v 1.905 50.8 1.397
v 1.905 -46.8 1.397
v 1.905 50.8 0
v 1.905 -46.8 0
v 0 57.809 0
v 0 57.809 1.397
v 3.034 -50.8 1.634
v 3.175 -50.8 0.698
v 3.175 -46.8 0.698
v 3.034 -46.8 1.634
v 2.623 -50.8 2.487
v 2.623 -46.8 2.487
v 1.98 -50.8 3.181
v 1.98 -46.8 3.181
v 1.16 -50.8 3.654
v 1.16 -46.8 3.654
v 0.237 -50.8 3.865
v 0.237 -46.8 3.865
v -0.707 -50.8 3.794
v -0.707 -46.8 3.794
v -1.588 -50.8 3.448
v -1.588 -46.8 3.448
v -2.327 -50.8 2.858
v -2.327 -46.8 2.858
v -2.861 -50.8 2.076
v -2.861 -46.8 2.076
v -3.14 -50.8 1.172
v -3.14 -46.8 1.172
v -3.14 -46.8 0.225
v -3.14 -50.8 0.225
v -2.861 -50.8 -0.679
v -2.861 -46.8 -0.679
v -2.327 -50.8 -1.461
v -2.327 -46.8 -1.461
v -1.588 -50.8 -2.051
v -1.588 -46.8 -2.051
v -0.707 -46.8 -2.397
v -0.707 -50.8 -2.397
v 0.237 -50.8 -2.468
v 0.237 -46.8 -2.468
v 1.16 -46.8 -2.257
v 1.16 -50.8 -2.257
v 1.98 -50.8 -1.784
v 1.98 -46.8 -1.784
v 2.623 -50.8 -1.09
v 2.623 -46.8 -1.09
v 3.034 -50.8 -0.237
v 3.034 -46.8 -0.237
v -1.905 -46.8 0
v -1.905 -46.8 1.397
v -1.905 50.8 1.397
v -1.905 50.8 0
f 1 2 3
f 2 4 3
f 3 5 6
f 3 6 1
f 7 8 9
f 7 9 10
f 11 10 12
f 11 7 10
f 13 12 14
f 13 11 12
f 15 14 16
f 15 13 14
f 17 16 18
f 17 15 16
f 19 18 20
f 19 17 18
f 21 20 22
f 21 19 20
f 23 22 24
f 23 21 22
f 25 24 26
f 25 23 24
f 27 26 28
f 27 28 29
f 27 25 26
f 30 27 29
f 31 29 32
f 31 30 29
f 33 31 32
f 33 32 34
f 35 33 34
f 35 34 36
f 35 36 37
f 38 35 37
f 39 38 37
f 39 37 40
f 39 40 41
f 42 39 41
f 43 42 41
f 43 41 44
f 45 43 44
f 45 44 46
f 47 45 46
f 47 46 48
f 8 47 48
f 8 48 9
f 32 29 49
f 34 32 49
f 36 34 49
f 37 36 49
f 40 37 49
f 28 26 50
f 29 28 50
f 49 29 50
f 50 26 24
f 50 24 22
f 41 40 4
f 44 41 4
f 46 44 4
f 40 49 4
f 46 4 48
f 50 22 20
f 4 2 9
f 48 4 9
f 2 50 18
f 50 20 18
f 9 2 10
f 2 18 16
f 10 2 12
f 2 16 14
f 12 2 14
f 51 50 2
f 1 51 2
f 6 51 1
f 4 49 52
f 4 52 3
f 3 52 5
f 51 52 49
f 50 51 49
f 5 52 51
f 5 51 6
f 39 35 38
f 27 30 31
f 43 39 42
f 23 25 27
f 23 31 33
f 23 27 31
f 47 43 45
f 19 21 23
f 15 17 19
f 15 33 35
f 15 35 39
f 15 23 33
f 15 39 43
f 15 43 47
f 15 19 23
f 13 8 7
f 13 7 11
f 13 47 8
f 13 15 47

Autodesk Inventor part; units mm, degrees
ref_plane "YZ Plane" through (0, 0, 0) normal (1, 0, 0) x (0, 1, 0)
sketch "Sketch1" plane through (0, 0, 0) normal (0, 0, 1) x (1, 0, 0)
  line L0 (-1.905, -50.8) -> (1.905, -50.8)
  line L1 (1.905, -50.8) -> (1.905, 50.8)
  line L2 (1.905, 50.8) -> (-1.905, 50.8) construction
  line L3 (-1.905, 50.8) -> (-1.905, -50.8)
  line L4 (-1.905, -50.8) -> (1.905, 50.8) construction
  line L5 (1.905, -50.8) -> (-1.905, 50.8) construction
  line L6 (-1.905, 50.8) -> (0, 57.8088)
  line L7 (0, 57.8088) -> (1.905, 50.8)
  line L8 (0, 50.8) -> (0, 57.8088) construction
  point P0 (0, 0)
  dimension "d0" = 3.81
  dimension "d1" = 101.6
extrude "Extrusion1" add sketch "Sketch1" along normal blind 1.397
sketch "Sketch2" plane through (-1.905, -50.8, 0) normal (0, -1, 0) x (1, 0, 0)
  line L0 (0, 0) -> (3.81, 1.397) construction
  line L1 (3.81, 1.397) -> (3.81, 0) construction
  line L2 (3.81, 0) -> (0, 1.397) construction
  circle A0 centre (1.905, 0.6985) radius 3.175
  point P0 (1.905, 0)
  dimension "d4" = 6.35
extrude "Extrusion2" add sketch "Sketch2" against normal blind 4.0005
ref_plane "Work Plane1" through (0, -48.7997, 0.6985) normal (0, 1, 0) x (1, 0, 0)
ref_plane "Work Plane2" through (0, -50.8, 0.6985) normal (0, -1, 0) x (1, 0, 0)
ref_plane "Work Plane3" through (0, 0, 0.6985) normal (0, 0, 1) x (1, 0, 0)
properties part number "Zip tie start"
